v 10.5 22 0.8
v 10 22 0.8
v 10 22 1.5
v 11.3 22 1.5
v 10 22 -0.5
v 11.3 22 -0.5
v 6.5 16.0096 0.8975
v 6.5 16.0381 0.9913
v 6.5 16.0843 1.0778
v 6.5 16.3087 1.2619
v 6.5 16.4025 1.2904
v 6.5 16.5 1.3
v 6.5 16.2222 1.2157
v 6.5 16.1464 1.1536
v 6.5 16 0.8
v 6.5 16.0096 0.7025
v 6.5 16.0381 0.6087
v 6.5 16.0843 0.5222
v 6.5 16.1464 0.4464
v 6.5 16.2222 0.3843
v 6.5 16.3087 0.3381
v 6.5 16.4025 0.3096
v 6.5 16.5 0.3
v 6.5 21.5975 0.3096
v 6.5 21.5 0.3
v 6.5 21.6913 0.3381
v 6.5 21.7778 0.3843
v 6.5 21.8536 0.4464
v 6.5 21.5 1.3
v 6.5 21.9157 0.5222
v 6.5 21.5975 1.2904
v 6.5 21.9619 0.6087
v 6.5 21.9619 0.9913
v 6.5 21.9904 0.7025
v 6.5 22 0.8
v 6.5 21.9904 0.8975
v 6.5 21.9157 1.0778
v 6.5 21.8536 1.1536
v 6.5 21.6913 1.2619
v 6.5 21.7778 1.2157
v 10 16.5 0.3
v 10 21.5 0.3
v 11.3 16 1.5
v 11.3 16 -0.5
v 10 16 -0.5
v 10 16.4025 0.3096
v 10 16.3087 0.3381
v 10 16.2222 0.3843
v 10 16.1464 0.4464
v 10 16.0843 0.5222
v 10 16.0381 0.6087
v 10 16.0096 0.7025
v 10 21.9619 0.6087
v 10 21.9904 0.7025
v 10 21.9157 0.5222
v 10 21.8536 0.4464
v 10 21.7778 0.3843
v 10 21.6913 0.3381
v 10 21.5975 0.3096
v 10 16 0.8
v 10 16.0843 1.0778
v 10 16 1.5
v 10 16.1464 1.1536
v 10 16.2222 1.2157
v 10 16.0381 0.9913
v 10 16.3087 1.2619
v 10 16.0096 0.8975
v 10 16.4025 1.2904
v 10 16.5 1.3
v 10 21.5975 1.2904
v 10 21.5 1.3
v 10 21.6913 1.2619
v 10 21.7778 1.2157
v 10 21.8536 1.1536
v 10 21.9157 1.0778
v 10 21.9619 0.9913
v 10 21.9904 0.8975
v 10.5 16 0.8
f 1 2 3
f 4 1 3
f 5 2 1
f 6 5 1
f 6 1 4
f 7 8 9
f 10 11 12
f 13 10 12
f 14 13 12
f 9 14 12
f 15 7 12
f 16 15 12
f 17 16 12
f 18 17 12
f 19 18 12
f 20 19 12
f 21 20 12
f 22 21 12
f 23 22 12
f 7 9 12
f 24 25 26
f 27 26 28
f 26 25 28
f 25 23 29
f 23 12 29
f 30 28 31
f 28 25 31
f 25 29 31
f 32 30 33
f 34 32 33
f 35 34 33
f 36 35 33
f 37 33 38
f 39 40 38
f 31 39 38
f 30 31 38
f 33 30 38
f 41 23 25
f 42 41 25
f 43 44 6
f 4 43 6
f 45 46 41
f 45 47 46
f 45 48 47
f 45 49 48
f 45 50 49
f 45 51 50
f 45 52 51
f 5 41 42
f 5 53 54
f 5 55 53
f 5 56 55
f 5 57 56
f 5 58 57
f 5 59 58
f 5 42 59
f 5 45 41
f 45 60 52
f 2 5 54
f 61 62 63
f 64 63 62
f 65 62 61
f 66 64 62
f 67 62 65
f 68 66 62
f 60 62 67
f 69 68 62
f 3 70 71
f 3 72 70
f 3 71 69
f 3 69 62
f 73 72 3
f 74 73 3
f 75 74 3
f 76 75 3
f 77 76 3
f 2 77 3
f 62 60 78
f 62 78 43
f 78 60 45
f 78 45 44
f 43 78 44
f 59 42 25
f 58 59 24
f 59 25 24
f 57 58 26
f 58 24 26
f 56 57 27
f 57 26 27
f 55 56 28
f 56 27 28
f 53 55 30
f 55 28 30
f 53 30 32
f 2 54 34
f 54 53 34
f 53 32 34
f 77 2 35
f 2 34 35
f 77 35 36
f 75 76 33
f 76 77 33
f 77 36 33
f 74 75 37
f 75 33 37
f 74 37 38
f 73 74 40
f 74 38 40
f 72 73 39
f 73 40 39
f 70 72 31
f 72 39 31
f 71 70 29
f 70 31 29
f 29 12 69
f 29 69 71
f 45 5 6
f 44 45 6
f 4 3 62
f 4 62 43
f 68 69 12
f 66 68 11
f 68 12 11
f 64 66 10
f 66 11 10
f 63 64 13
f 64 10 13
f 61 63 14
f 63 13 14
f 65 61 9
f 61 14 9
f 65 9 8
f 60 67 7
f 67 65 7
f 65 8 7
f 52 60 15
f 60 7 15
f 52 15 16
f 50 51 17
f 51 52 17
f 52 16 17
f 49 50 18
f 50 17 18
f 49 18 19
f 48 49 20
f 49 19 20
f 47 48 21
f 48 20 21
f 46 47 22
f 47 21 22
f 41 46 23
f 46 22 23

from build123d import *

# Parameters (mm, degrees)
BOX003_W         = 1.3
BOX003_H         = 6
BOX003_DEPTH     = 2
EXTRUDE002_DEPTH = 4


with BuildPart() as cube:
    # Box003 → Box003 (new body)
    with BuildSketch(Plane(origin=(0, 16, 0.5), x_dir=(1, 0, 0), z_dir=(0, 0, 1))):
        with Locations((0.65, 3)):
            Rectangle(BOX003_W, BOX003_H)
    extrude(amount=BOX003_DEPTH)


with BuildPart() as fusion:
    # Sketch006 → Extrude002 (new body)
    with BuildSketch(Plane.YZ):
        with BuildLine():
            ThreePointArc((14, -1), (13.5, -1.5), (14, -2))
            Line((14, -2), (19, -2))
            ThreePointArc((19, -2), (19.5, -1.5), (19, -1))
            Line((14, -1), (19, -1))
        make_face()
    extrude(amount=EXTRUDE002_DEPTH)


with BuildPart() as fusion_1:
    # Extrude002 placement: moved
    add(fusion.part.moved(Location((-3.5, 2.5, 3.3))))

    # Fusion: union Cube
    add(cube.part)


with BuildPart() as fusion_2:
    # Fusion placement: moved
    add(fusion_1.part.moved(Location((10, 0, -1))))


solid = fusion_2.part
